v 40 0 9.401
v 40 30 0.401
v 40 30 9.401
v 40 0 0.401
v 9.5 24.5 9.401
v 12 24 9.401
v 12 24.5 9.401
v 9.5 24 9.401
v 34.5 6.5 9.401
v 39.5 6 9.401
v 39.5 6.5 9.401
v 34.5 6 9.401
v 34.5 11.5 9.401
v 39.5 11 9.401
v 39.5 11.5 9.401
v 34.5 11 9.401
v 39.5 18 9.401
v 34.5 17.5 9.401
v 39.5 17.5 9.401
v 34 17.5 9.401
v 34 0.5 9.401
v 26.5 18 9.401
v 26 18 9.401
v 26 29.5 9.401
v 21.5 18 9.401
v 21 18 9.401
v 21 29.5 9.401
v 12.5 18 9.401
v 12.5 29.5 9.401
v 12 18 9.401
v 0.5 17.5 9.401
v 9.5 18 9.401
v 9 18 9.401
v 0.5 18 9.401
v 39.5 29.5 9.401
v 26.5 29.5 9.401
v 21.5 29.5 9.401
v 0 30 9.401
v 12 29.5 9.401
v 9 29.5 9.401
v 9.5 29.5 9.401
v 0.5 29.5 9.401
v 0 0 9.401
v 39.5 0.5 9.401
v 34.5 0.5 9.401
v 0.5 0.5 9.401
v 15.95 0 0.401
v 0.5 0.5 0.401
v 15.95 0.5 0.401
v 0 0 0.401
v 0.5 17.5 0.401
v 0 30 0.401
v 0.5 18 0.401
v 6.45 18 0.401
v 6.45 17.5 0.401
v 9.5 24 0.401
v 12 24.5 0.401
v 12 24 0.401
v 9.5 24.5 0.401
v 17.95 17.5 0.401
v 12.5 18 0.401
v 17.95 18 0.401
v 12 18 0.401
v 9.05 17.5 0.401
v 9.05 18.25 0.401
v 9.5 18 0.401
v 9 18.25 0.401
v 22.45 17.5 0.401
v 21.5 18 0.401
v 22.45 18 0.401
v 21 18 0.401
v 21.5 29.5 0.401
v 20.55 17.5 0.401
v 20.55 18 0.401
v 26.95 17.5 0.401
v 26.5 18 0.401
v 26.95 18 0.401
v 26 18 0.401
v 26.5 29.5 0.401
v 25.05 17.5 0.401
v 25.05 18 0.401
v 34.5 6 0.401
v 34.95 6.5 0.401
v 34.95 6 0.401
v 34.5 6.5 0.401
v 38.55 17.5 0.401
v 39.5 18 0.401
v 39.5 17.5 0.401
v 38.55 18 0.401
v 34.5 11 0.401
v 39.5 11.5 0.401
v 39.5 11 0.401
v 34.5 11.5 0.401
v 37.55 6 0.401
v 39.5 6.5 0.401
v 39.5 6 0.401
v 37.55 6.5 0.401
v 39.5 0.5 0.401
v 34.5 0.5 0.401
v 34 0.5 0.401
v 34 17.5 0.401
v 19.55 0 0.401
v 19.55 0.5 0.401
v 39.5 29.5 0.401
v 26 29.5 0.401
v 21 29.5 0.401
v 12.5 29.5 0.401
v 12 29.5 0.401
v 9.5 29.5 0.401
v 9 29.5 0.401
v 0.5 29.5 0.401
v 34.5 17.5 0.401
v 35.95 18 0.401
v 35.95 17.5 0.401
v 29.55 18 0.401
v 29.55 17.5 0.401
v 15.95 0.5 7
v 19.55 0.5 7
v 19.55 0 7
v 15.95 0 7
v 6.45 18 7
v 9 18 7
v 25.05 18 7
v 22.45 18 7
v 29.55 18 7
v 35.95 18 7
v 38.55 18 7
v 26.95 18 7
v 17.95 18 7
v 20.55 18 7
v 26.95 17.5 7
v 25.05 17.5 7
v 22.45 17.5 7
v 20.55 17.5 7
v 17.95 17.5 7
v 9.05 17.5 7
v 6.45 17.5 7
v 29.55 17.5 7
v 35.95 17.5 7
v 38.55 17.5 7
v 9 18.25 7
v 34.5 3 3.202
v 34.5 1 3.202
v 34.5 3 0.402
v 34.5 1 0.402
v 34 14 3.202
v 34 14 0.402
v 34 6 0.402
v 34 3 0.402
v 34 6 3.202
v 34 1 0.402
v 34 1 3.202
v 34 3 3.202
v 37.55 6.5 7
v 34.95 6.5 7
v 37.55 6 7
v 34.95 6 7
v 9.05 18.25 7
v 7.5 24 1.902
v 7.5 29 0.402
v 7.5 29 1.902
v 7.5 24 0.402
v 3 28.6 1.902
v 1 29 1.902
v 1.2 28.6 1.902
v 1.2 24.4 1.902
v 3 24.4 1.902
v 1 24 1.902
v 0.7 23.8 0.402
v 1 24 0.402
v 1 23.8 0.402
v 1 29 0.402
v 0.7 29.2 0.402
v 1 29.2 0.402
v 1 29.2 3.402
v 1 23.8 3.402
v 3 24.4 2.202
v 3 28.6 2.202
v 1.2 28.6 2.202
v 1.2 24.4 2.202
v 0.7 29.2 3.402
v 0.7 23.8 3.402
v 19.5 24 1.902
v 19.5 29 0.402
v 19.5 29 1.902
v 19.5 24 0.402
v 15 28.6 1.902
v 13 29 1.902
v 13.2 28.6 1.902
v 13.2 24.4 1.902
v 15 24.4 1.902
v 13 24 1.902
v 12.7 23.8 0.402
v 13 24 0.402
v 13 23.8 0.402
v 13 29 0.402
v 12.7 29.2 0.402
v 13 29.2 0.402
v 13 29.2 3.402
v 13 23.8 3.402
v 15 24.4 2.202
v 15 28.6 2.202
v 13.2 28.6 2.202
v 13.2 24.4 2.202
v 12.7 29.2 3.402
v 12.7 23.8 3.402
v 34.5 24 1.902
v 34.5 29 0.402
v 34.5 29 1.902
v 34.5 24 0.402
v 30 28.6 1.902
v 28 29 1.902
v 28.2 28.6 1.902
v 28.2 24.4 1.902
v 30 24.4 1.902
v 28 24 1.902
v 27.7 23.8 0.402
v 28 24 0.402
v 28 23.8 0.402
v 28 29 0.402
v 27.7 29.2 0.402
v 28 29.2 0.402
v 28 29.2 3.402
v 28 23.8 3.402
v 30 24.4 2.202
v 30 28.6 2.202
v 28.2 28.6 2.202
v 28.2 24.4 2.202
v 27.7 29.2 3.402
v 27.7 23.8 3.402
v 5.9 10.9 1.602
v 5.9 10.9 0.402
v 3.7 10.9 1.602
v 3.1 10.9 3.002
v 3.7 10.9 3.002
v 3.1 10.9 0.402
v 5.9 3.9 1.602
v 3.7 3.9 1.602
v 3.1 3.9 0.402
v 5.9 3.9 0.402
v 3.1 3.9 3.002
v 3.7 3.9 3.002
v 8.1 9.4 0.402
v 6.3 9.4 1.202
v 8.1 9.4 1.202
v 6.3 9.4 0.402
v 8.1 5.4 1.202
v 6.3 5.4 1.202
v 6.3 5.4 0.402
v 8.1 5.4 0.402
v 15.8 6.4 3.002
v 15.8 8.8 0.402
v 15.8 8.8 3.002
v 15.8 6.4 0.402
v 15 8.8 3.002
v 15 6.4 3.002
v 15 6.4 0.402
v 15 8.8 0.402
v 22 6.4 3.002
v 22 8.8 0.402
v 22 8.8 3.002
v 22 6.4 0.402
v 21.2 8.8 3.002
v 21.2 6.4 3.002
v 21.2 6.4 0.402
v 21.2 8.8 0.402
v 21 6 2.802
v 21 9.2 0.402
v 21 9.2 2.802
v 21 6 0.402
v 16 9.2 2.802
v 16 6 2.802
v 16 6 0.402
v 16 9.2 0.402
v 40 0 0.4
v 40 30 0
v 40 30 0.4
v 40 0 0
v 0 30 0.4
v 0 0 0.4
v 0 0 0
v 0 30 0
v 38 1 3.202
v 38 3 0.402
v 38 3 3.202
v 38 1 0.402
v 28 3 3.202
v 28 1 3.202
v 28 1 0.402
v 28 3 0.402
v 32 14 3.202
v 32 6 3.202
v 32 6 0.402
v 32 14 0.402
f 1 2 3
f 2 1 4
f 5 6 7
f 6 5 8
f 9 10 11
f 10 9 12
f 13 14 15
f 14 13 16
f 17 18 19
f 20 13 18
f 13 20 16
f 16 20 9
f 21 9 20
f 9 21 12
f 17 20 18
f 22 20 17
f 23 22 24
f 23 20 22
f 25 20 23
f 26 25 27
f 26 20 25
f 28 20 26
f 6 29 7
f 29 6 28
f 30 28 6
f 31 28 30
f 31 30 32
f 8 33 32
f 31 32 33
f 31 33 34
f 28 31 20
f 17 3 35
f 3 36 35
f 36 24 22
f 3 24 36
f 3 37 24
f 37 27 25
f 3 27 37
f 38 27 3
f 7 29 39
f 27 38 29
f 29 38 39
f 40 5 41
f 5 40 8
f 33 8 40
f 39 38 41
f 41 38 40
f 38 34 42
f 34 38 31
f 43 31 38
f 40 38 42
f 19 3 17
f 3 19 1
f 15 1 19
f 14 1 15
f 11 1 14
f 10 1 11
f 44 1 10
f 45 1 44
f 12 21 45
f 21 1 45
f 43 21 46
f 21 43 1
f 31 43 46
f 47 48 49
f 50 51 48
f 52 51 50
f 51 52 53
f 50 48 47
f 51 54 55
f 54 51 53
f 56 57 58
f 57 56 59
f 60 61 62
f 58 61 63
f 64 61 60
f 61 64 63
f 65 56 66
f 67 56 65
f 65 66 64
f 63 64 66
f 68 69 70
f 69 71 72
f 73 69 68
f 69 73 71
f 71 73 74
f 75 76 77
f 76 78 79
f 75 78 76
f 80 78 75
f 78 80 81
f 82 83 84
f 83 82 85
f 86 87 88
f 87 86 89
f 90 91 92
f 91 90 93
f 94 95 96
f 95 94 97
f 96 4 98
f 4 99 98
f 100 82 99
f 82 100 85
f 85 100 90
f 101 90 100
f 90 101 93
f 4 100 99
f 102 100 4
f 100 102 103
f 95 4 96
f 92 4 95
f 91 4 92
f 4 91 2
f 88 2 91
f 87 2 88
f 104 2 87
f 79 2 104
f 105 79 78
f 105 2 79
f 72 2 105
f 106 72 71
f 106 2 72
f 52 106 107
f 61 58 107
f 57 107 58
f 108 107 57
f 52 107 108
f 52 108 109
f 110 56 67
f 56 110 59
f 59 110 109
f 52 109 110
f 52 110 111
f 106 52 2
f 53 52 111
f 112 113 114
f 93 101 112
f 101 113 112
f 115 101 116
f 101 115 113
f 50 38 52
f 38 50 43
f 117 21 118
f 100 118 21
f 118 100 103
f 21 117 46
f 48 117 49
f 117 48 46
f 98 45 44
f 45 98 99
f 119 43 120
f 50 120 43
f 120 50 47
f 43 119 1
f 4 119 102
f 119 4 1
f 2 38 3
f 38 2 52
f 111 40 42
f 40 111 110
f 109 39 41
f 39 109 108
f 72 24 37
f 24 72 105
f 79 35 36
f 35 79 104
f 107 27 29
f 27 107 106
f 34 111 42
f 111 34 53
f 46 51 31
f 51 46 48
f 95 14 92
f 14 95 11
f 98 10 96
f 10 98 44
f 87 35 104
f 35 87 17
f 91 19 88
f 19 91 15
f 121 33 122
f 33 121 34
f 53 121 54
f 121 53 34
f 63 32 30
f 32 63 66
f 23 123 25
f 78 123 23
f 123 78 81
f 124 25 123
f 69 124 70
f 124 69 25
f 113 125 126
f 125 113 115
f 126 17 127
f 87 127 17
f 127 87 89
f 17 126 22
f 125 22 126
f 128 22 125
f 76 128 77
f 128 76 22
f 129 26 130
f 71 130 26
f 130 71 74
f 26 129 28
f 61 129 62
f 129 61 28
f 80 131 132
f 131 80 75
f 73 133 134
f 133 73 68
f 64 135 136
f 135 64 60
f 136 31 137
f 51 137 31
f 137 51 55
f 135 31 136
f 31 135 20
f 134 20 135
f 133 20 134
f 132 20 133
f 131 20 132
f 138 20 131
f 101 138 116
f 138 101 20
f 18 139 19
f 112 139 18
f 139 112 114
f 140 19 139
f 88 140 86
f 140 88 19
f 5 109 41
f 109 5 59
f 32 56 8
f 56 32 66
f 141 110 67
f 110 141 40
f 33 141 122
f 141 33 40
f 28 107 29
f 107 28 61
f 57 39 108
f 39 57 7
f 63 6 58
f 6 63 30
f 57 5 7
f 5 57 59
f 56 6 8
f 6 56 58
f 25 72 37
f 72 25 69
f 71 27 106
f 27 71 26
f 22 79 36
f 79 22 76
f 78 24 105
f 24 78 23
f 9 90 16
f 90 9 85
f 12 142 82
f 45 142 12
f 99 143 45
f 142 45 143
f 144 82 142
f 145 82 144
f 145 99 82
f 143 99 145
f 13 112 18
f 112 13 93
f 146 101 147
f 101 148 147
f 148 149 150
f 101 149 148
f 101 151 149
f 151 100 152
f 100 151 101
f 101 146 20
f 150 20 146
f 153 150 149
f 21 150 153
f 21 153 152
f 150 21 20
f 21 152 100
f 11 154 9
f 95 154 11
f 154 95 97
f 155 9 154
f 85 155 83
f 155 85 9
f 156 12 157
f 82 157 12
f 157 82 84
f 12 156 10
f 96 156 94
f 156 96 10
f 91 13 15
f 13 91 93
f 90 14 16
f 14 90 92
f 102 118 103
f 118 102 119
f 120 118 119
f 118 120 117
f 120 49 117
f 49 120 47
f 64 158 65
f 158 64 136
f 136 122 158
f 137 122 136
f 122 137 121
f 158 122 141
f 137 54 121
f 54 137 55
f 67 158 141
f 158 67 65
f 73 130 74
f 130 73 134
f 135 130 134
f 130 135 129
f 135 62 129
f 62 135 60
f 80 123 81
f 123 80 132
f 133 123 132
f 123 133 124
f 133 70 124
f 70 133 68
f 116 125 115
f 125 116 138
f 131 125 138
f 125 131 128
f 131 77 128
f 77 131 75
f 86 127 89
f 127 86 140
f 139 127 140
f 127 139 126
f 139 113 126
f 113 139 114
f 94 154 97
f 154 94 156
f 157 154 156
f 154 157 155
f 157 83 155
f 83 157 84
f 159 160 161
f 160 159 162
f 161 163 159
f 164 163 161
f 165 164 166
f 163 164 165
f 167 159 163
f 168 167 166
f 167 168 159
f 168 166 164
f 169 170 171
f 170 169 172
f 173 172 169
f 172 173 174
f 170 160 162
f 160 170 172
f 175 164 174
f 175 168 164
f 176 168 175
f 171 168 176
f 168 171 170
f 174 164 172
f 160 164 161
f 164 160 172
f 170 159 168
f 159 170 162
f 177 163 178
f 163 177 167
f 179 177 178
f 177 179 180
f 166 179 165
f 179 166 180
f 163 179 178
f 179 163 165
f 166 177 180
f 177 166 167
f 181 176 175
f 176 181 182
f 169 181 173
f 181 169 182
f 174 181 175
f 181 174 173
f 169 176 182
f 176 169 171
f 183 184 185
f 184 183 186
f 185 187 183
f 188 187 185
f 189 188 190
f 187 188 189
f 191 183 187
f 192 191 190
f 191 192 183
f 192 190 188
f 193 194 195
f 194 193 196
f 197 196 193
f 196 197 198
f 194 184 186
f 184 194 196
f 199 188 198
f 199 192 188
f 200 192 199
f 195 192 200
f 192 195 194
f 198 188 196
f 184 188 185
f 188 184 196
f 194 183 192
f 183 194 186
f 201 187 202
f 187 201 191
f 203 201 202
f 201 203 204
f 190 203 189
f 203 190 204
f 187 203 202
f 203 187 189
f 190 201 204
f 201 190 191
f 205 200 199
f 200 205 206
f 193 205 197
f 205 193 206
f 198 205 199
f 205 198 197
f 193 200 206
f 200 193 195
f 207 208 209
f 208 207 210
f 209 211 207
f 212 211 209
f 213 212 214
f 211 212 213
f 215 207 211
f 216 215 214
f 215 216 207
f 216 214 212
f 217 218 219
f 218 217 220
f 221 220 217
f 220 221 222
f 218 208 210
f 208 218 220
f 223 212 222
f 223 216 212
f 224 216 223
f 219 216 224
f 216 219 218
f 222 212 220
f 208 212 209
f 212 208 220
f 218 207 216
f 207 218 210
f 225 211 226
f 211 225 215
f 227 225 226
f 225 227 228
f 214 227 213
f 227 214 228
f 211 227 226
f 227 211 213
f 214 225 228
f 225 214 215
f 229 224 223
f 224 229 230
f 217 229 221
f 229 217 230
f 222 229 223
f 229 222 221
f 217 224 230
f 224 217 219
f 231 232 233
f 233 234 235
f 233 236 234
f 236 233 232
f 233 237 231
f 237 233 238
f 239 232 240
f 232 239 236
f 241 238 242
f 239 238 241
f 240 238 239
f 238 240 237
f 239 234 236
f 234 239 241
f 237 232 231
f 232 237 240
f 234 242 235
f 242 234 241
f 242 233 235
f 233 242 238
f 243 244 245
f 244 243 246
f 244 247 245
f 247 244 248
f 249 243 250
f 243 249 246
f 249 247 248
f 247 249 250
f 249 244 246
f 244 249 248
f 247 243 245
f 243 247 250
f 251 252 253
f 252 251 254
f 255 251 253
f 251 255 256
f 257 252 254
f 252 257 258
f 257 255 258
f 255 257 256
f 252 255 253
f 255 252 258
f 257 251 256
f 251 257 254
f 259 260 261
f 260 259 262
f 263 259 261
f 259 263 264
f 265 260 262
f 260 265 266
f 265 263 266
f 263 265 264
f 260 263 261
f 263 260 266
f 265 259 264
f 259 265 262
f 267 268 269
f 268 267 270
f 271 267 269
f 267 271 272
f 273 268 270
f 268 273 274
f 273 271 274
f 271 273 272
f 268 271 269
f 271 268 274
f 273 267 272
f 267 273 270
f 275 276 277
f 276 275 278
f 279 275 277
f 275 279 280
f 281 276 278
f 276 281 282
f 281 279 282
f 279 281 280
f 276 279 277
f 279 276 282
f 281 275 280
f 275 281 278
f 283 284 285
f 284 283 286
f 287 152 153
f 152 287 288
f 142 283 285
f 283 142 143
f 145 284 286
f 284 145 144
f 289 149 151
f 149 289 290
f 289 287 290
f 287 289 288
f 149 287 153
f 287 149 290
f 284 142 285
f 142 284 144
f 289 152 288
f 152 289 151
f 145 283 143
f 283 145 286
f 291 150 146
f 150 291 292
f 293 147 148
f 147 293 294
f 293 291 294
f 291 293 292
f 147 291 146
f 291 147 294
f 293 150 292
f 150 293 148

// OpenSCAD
$fn = 20;
wall_h = 9.0;
wall_t = 0.5;
door_h = 7.0;
floor_h = 0.4;

module wall_seg(x, y, w, d, h=wall_h) {
    translate([x, y, floor_h + 0.001]) cube([w, d, h]);
}

module door_gap(x, y, w, d) {
    translate([x - 0.05, y - 0.05, -0.1]) cube([w + 0.1, d + 0.1, door_h + 0.1]);
}

module bed(x, y, rot=0) {
    translate([x + 3.25, y + 2.5, floor_h + 0.002]) rotate([0, 0, rot]) translate([-3.25, -2.5, 0]) {
        color("Crimson") cube([6.5, 5.0, 1.5]);
        color("Snow") translate([0.2, 0.4, 1.5]) cube([1.8, 4.2, 0.3]);
        color("SaddleBrown") translate([-0.3, -0.2, 0]) cube([0.3, 5.4, 3.0]);
    }
}

module sofa(x, y, rot=0) {
    translate([x + 3.5, y + 1.4, floor_h + 0.002]) rotate([0, 0, rot]) translate([-3.5, -1.4, 0]) {
        color("RoyalBlue") {
            cube([7.0, 2.8, 1.2]);
            translate([0, 2.2, 1.2]) cube([7.0, 0.6, 1.4]);
        }
        color("DarkGoldenrod") translate([1.5, -2.2, 0]) cube([4.0, 1.8, 0.8]);
    }
}

module dining_table(x, y, rot=0) {
    translate([x + 2.5, y + 1.6, floor_h + 0.002]) rotate([0, 0, rot]) translate([-2.5, -1.6, 0]) {
        color("SaddleBrown") cube([5.0, 3.2, 2.4]);
        color("Tan") {
            translate([-1.0, 0.4, 0]) cube([0.8, 2.4, 2.6]);
            translate([5.2, 0.4, 0]) cube([0.8, 2.4, 2.6]);
        }
    }
}

module kitchen_counter(x, y, w, d, rot=0) {
    translate([x + w/2, y + d/2, floor_h + 0.002]) rotate([0, 0, rot]) translate([-w/2, -d/2, 0]) {
        color("DarkSlateGray") cube([w, d, 2.8]);
    }
}

// Base Floor
color("LightGray") cube([40, 30, floor_h]);

// Walls Structure
color("WhiteSmoke") difference() {
    union() {
        // Outer Walls
        wall_seg(0, 0, 40, 0.5);
        wall_seg(0, 29.5, 40, 0.5);
        wall_seg(0, 0.5, 0.5, 29);
        wall_seg(39.5, 0.5, 0.5, 29);

        // Inner Walls
        wall_seg(0.5, 17.5, 39, 0.5); // Main horizontal divider
        wall_seg(9, 18, 0.5, 11.5);   // Bed 2 / Closet divider
        wall_seg(12, 18, 0.5, 11.5);  // Closet / Bed 3 divider
        wall_seg(9.5, 24, 2.5, 0.5);  // Closet horizontal divider
        wall_seg(21, 18, 0.5, 11.5);  // Bed 3 / Bath divider
        wall_seg(26, 18, 0.5, 11.5);  // Bath / Master Bed divider
        wall_seg(34, 0.5, 0.5, 17);   // Master Closet / Washroom divider
        wall_seg(34.5, 6, 5, 0.5);    // Washroom top wall
        wall_seg(34.5, 11, 5, 0.5);   // Closet bottom wall
    }
    
    // Door Gaps
    door_gap(16, -0.1, 3.5, 0.7);   // Main entrance
    door_gap(6.5, 17.3, 2.5, 0.9);  // Bed 2 door
    door_gap(18, 17.3, 2.5, 0.9);   // Bed 3 door
    door_gap(22.5, 17.3, 2.5, 0.9); // Bath door
    door_gap(27, 17.3, 2.5, 0.9);   // Master Bed door
    door_gap(36, 17.3, 2.5, 0.9);   // Master Closet door
    door_gap(35, 5.8, 2.5, 0.9);    // Washroom door
}

// Furniture
bed(1, 24, 0);
bed(13, 24, 0);
bed(28, 24, 0);
sofa(1, 6, 90);
dining_table(16, 6, 0);
kitchen_counter(28, 1, 10, 2, 0);
kitchen_counter(32, 6, 2, 8, 0);
